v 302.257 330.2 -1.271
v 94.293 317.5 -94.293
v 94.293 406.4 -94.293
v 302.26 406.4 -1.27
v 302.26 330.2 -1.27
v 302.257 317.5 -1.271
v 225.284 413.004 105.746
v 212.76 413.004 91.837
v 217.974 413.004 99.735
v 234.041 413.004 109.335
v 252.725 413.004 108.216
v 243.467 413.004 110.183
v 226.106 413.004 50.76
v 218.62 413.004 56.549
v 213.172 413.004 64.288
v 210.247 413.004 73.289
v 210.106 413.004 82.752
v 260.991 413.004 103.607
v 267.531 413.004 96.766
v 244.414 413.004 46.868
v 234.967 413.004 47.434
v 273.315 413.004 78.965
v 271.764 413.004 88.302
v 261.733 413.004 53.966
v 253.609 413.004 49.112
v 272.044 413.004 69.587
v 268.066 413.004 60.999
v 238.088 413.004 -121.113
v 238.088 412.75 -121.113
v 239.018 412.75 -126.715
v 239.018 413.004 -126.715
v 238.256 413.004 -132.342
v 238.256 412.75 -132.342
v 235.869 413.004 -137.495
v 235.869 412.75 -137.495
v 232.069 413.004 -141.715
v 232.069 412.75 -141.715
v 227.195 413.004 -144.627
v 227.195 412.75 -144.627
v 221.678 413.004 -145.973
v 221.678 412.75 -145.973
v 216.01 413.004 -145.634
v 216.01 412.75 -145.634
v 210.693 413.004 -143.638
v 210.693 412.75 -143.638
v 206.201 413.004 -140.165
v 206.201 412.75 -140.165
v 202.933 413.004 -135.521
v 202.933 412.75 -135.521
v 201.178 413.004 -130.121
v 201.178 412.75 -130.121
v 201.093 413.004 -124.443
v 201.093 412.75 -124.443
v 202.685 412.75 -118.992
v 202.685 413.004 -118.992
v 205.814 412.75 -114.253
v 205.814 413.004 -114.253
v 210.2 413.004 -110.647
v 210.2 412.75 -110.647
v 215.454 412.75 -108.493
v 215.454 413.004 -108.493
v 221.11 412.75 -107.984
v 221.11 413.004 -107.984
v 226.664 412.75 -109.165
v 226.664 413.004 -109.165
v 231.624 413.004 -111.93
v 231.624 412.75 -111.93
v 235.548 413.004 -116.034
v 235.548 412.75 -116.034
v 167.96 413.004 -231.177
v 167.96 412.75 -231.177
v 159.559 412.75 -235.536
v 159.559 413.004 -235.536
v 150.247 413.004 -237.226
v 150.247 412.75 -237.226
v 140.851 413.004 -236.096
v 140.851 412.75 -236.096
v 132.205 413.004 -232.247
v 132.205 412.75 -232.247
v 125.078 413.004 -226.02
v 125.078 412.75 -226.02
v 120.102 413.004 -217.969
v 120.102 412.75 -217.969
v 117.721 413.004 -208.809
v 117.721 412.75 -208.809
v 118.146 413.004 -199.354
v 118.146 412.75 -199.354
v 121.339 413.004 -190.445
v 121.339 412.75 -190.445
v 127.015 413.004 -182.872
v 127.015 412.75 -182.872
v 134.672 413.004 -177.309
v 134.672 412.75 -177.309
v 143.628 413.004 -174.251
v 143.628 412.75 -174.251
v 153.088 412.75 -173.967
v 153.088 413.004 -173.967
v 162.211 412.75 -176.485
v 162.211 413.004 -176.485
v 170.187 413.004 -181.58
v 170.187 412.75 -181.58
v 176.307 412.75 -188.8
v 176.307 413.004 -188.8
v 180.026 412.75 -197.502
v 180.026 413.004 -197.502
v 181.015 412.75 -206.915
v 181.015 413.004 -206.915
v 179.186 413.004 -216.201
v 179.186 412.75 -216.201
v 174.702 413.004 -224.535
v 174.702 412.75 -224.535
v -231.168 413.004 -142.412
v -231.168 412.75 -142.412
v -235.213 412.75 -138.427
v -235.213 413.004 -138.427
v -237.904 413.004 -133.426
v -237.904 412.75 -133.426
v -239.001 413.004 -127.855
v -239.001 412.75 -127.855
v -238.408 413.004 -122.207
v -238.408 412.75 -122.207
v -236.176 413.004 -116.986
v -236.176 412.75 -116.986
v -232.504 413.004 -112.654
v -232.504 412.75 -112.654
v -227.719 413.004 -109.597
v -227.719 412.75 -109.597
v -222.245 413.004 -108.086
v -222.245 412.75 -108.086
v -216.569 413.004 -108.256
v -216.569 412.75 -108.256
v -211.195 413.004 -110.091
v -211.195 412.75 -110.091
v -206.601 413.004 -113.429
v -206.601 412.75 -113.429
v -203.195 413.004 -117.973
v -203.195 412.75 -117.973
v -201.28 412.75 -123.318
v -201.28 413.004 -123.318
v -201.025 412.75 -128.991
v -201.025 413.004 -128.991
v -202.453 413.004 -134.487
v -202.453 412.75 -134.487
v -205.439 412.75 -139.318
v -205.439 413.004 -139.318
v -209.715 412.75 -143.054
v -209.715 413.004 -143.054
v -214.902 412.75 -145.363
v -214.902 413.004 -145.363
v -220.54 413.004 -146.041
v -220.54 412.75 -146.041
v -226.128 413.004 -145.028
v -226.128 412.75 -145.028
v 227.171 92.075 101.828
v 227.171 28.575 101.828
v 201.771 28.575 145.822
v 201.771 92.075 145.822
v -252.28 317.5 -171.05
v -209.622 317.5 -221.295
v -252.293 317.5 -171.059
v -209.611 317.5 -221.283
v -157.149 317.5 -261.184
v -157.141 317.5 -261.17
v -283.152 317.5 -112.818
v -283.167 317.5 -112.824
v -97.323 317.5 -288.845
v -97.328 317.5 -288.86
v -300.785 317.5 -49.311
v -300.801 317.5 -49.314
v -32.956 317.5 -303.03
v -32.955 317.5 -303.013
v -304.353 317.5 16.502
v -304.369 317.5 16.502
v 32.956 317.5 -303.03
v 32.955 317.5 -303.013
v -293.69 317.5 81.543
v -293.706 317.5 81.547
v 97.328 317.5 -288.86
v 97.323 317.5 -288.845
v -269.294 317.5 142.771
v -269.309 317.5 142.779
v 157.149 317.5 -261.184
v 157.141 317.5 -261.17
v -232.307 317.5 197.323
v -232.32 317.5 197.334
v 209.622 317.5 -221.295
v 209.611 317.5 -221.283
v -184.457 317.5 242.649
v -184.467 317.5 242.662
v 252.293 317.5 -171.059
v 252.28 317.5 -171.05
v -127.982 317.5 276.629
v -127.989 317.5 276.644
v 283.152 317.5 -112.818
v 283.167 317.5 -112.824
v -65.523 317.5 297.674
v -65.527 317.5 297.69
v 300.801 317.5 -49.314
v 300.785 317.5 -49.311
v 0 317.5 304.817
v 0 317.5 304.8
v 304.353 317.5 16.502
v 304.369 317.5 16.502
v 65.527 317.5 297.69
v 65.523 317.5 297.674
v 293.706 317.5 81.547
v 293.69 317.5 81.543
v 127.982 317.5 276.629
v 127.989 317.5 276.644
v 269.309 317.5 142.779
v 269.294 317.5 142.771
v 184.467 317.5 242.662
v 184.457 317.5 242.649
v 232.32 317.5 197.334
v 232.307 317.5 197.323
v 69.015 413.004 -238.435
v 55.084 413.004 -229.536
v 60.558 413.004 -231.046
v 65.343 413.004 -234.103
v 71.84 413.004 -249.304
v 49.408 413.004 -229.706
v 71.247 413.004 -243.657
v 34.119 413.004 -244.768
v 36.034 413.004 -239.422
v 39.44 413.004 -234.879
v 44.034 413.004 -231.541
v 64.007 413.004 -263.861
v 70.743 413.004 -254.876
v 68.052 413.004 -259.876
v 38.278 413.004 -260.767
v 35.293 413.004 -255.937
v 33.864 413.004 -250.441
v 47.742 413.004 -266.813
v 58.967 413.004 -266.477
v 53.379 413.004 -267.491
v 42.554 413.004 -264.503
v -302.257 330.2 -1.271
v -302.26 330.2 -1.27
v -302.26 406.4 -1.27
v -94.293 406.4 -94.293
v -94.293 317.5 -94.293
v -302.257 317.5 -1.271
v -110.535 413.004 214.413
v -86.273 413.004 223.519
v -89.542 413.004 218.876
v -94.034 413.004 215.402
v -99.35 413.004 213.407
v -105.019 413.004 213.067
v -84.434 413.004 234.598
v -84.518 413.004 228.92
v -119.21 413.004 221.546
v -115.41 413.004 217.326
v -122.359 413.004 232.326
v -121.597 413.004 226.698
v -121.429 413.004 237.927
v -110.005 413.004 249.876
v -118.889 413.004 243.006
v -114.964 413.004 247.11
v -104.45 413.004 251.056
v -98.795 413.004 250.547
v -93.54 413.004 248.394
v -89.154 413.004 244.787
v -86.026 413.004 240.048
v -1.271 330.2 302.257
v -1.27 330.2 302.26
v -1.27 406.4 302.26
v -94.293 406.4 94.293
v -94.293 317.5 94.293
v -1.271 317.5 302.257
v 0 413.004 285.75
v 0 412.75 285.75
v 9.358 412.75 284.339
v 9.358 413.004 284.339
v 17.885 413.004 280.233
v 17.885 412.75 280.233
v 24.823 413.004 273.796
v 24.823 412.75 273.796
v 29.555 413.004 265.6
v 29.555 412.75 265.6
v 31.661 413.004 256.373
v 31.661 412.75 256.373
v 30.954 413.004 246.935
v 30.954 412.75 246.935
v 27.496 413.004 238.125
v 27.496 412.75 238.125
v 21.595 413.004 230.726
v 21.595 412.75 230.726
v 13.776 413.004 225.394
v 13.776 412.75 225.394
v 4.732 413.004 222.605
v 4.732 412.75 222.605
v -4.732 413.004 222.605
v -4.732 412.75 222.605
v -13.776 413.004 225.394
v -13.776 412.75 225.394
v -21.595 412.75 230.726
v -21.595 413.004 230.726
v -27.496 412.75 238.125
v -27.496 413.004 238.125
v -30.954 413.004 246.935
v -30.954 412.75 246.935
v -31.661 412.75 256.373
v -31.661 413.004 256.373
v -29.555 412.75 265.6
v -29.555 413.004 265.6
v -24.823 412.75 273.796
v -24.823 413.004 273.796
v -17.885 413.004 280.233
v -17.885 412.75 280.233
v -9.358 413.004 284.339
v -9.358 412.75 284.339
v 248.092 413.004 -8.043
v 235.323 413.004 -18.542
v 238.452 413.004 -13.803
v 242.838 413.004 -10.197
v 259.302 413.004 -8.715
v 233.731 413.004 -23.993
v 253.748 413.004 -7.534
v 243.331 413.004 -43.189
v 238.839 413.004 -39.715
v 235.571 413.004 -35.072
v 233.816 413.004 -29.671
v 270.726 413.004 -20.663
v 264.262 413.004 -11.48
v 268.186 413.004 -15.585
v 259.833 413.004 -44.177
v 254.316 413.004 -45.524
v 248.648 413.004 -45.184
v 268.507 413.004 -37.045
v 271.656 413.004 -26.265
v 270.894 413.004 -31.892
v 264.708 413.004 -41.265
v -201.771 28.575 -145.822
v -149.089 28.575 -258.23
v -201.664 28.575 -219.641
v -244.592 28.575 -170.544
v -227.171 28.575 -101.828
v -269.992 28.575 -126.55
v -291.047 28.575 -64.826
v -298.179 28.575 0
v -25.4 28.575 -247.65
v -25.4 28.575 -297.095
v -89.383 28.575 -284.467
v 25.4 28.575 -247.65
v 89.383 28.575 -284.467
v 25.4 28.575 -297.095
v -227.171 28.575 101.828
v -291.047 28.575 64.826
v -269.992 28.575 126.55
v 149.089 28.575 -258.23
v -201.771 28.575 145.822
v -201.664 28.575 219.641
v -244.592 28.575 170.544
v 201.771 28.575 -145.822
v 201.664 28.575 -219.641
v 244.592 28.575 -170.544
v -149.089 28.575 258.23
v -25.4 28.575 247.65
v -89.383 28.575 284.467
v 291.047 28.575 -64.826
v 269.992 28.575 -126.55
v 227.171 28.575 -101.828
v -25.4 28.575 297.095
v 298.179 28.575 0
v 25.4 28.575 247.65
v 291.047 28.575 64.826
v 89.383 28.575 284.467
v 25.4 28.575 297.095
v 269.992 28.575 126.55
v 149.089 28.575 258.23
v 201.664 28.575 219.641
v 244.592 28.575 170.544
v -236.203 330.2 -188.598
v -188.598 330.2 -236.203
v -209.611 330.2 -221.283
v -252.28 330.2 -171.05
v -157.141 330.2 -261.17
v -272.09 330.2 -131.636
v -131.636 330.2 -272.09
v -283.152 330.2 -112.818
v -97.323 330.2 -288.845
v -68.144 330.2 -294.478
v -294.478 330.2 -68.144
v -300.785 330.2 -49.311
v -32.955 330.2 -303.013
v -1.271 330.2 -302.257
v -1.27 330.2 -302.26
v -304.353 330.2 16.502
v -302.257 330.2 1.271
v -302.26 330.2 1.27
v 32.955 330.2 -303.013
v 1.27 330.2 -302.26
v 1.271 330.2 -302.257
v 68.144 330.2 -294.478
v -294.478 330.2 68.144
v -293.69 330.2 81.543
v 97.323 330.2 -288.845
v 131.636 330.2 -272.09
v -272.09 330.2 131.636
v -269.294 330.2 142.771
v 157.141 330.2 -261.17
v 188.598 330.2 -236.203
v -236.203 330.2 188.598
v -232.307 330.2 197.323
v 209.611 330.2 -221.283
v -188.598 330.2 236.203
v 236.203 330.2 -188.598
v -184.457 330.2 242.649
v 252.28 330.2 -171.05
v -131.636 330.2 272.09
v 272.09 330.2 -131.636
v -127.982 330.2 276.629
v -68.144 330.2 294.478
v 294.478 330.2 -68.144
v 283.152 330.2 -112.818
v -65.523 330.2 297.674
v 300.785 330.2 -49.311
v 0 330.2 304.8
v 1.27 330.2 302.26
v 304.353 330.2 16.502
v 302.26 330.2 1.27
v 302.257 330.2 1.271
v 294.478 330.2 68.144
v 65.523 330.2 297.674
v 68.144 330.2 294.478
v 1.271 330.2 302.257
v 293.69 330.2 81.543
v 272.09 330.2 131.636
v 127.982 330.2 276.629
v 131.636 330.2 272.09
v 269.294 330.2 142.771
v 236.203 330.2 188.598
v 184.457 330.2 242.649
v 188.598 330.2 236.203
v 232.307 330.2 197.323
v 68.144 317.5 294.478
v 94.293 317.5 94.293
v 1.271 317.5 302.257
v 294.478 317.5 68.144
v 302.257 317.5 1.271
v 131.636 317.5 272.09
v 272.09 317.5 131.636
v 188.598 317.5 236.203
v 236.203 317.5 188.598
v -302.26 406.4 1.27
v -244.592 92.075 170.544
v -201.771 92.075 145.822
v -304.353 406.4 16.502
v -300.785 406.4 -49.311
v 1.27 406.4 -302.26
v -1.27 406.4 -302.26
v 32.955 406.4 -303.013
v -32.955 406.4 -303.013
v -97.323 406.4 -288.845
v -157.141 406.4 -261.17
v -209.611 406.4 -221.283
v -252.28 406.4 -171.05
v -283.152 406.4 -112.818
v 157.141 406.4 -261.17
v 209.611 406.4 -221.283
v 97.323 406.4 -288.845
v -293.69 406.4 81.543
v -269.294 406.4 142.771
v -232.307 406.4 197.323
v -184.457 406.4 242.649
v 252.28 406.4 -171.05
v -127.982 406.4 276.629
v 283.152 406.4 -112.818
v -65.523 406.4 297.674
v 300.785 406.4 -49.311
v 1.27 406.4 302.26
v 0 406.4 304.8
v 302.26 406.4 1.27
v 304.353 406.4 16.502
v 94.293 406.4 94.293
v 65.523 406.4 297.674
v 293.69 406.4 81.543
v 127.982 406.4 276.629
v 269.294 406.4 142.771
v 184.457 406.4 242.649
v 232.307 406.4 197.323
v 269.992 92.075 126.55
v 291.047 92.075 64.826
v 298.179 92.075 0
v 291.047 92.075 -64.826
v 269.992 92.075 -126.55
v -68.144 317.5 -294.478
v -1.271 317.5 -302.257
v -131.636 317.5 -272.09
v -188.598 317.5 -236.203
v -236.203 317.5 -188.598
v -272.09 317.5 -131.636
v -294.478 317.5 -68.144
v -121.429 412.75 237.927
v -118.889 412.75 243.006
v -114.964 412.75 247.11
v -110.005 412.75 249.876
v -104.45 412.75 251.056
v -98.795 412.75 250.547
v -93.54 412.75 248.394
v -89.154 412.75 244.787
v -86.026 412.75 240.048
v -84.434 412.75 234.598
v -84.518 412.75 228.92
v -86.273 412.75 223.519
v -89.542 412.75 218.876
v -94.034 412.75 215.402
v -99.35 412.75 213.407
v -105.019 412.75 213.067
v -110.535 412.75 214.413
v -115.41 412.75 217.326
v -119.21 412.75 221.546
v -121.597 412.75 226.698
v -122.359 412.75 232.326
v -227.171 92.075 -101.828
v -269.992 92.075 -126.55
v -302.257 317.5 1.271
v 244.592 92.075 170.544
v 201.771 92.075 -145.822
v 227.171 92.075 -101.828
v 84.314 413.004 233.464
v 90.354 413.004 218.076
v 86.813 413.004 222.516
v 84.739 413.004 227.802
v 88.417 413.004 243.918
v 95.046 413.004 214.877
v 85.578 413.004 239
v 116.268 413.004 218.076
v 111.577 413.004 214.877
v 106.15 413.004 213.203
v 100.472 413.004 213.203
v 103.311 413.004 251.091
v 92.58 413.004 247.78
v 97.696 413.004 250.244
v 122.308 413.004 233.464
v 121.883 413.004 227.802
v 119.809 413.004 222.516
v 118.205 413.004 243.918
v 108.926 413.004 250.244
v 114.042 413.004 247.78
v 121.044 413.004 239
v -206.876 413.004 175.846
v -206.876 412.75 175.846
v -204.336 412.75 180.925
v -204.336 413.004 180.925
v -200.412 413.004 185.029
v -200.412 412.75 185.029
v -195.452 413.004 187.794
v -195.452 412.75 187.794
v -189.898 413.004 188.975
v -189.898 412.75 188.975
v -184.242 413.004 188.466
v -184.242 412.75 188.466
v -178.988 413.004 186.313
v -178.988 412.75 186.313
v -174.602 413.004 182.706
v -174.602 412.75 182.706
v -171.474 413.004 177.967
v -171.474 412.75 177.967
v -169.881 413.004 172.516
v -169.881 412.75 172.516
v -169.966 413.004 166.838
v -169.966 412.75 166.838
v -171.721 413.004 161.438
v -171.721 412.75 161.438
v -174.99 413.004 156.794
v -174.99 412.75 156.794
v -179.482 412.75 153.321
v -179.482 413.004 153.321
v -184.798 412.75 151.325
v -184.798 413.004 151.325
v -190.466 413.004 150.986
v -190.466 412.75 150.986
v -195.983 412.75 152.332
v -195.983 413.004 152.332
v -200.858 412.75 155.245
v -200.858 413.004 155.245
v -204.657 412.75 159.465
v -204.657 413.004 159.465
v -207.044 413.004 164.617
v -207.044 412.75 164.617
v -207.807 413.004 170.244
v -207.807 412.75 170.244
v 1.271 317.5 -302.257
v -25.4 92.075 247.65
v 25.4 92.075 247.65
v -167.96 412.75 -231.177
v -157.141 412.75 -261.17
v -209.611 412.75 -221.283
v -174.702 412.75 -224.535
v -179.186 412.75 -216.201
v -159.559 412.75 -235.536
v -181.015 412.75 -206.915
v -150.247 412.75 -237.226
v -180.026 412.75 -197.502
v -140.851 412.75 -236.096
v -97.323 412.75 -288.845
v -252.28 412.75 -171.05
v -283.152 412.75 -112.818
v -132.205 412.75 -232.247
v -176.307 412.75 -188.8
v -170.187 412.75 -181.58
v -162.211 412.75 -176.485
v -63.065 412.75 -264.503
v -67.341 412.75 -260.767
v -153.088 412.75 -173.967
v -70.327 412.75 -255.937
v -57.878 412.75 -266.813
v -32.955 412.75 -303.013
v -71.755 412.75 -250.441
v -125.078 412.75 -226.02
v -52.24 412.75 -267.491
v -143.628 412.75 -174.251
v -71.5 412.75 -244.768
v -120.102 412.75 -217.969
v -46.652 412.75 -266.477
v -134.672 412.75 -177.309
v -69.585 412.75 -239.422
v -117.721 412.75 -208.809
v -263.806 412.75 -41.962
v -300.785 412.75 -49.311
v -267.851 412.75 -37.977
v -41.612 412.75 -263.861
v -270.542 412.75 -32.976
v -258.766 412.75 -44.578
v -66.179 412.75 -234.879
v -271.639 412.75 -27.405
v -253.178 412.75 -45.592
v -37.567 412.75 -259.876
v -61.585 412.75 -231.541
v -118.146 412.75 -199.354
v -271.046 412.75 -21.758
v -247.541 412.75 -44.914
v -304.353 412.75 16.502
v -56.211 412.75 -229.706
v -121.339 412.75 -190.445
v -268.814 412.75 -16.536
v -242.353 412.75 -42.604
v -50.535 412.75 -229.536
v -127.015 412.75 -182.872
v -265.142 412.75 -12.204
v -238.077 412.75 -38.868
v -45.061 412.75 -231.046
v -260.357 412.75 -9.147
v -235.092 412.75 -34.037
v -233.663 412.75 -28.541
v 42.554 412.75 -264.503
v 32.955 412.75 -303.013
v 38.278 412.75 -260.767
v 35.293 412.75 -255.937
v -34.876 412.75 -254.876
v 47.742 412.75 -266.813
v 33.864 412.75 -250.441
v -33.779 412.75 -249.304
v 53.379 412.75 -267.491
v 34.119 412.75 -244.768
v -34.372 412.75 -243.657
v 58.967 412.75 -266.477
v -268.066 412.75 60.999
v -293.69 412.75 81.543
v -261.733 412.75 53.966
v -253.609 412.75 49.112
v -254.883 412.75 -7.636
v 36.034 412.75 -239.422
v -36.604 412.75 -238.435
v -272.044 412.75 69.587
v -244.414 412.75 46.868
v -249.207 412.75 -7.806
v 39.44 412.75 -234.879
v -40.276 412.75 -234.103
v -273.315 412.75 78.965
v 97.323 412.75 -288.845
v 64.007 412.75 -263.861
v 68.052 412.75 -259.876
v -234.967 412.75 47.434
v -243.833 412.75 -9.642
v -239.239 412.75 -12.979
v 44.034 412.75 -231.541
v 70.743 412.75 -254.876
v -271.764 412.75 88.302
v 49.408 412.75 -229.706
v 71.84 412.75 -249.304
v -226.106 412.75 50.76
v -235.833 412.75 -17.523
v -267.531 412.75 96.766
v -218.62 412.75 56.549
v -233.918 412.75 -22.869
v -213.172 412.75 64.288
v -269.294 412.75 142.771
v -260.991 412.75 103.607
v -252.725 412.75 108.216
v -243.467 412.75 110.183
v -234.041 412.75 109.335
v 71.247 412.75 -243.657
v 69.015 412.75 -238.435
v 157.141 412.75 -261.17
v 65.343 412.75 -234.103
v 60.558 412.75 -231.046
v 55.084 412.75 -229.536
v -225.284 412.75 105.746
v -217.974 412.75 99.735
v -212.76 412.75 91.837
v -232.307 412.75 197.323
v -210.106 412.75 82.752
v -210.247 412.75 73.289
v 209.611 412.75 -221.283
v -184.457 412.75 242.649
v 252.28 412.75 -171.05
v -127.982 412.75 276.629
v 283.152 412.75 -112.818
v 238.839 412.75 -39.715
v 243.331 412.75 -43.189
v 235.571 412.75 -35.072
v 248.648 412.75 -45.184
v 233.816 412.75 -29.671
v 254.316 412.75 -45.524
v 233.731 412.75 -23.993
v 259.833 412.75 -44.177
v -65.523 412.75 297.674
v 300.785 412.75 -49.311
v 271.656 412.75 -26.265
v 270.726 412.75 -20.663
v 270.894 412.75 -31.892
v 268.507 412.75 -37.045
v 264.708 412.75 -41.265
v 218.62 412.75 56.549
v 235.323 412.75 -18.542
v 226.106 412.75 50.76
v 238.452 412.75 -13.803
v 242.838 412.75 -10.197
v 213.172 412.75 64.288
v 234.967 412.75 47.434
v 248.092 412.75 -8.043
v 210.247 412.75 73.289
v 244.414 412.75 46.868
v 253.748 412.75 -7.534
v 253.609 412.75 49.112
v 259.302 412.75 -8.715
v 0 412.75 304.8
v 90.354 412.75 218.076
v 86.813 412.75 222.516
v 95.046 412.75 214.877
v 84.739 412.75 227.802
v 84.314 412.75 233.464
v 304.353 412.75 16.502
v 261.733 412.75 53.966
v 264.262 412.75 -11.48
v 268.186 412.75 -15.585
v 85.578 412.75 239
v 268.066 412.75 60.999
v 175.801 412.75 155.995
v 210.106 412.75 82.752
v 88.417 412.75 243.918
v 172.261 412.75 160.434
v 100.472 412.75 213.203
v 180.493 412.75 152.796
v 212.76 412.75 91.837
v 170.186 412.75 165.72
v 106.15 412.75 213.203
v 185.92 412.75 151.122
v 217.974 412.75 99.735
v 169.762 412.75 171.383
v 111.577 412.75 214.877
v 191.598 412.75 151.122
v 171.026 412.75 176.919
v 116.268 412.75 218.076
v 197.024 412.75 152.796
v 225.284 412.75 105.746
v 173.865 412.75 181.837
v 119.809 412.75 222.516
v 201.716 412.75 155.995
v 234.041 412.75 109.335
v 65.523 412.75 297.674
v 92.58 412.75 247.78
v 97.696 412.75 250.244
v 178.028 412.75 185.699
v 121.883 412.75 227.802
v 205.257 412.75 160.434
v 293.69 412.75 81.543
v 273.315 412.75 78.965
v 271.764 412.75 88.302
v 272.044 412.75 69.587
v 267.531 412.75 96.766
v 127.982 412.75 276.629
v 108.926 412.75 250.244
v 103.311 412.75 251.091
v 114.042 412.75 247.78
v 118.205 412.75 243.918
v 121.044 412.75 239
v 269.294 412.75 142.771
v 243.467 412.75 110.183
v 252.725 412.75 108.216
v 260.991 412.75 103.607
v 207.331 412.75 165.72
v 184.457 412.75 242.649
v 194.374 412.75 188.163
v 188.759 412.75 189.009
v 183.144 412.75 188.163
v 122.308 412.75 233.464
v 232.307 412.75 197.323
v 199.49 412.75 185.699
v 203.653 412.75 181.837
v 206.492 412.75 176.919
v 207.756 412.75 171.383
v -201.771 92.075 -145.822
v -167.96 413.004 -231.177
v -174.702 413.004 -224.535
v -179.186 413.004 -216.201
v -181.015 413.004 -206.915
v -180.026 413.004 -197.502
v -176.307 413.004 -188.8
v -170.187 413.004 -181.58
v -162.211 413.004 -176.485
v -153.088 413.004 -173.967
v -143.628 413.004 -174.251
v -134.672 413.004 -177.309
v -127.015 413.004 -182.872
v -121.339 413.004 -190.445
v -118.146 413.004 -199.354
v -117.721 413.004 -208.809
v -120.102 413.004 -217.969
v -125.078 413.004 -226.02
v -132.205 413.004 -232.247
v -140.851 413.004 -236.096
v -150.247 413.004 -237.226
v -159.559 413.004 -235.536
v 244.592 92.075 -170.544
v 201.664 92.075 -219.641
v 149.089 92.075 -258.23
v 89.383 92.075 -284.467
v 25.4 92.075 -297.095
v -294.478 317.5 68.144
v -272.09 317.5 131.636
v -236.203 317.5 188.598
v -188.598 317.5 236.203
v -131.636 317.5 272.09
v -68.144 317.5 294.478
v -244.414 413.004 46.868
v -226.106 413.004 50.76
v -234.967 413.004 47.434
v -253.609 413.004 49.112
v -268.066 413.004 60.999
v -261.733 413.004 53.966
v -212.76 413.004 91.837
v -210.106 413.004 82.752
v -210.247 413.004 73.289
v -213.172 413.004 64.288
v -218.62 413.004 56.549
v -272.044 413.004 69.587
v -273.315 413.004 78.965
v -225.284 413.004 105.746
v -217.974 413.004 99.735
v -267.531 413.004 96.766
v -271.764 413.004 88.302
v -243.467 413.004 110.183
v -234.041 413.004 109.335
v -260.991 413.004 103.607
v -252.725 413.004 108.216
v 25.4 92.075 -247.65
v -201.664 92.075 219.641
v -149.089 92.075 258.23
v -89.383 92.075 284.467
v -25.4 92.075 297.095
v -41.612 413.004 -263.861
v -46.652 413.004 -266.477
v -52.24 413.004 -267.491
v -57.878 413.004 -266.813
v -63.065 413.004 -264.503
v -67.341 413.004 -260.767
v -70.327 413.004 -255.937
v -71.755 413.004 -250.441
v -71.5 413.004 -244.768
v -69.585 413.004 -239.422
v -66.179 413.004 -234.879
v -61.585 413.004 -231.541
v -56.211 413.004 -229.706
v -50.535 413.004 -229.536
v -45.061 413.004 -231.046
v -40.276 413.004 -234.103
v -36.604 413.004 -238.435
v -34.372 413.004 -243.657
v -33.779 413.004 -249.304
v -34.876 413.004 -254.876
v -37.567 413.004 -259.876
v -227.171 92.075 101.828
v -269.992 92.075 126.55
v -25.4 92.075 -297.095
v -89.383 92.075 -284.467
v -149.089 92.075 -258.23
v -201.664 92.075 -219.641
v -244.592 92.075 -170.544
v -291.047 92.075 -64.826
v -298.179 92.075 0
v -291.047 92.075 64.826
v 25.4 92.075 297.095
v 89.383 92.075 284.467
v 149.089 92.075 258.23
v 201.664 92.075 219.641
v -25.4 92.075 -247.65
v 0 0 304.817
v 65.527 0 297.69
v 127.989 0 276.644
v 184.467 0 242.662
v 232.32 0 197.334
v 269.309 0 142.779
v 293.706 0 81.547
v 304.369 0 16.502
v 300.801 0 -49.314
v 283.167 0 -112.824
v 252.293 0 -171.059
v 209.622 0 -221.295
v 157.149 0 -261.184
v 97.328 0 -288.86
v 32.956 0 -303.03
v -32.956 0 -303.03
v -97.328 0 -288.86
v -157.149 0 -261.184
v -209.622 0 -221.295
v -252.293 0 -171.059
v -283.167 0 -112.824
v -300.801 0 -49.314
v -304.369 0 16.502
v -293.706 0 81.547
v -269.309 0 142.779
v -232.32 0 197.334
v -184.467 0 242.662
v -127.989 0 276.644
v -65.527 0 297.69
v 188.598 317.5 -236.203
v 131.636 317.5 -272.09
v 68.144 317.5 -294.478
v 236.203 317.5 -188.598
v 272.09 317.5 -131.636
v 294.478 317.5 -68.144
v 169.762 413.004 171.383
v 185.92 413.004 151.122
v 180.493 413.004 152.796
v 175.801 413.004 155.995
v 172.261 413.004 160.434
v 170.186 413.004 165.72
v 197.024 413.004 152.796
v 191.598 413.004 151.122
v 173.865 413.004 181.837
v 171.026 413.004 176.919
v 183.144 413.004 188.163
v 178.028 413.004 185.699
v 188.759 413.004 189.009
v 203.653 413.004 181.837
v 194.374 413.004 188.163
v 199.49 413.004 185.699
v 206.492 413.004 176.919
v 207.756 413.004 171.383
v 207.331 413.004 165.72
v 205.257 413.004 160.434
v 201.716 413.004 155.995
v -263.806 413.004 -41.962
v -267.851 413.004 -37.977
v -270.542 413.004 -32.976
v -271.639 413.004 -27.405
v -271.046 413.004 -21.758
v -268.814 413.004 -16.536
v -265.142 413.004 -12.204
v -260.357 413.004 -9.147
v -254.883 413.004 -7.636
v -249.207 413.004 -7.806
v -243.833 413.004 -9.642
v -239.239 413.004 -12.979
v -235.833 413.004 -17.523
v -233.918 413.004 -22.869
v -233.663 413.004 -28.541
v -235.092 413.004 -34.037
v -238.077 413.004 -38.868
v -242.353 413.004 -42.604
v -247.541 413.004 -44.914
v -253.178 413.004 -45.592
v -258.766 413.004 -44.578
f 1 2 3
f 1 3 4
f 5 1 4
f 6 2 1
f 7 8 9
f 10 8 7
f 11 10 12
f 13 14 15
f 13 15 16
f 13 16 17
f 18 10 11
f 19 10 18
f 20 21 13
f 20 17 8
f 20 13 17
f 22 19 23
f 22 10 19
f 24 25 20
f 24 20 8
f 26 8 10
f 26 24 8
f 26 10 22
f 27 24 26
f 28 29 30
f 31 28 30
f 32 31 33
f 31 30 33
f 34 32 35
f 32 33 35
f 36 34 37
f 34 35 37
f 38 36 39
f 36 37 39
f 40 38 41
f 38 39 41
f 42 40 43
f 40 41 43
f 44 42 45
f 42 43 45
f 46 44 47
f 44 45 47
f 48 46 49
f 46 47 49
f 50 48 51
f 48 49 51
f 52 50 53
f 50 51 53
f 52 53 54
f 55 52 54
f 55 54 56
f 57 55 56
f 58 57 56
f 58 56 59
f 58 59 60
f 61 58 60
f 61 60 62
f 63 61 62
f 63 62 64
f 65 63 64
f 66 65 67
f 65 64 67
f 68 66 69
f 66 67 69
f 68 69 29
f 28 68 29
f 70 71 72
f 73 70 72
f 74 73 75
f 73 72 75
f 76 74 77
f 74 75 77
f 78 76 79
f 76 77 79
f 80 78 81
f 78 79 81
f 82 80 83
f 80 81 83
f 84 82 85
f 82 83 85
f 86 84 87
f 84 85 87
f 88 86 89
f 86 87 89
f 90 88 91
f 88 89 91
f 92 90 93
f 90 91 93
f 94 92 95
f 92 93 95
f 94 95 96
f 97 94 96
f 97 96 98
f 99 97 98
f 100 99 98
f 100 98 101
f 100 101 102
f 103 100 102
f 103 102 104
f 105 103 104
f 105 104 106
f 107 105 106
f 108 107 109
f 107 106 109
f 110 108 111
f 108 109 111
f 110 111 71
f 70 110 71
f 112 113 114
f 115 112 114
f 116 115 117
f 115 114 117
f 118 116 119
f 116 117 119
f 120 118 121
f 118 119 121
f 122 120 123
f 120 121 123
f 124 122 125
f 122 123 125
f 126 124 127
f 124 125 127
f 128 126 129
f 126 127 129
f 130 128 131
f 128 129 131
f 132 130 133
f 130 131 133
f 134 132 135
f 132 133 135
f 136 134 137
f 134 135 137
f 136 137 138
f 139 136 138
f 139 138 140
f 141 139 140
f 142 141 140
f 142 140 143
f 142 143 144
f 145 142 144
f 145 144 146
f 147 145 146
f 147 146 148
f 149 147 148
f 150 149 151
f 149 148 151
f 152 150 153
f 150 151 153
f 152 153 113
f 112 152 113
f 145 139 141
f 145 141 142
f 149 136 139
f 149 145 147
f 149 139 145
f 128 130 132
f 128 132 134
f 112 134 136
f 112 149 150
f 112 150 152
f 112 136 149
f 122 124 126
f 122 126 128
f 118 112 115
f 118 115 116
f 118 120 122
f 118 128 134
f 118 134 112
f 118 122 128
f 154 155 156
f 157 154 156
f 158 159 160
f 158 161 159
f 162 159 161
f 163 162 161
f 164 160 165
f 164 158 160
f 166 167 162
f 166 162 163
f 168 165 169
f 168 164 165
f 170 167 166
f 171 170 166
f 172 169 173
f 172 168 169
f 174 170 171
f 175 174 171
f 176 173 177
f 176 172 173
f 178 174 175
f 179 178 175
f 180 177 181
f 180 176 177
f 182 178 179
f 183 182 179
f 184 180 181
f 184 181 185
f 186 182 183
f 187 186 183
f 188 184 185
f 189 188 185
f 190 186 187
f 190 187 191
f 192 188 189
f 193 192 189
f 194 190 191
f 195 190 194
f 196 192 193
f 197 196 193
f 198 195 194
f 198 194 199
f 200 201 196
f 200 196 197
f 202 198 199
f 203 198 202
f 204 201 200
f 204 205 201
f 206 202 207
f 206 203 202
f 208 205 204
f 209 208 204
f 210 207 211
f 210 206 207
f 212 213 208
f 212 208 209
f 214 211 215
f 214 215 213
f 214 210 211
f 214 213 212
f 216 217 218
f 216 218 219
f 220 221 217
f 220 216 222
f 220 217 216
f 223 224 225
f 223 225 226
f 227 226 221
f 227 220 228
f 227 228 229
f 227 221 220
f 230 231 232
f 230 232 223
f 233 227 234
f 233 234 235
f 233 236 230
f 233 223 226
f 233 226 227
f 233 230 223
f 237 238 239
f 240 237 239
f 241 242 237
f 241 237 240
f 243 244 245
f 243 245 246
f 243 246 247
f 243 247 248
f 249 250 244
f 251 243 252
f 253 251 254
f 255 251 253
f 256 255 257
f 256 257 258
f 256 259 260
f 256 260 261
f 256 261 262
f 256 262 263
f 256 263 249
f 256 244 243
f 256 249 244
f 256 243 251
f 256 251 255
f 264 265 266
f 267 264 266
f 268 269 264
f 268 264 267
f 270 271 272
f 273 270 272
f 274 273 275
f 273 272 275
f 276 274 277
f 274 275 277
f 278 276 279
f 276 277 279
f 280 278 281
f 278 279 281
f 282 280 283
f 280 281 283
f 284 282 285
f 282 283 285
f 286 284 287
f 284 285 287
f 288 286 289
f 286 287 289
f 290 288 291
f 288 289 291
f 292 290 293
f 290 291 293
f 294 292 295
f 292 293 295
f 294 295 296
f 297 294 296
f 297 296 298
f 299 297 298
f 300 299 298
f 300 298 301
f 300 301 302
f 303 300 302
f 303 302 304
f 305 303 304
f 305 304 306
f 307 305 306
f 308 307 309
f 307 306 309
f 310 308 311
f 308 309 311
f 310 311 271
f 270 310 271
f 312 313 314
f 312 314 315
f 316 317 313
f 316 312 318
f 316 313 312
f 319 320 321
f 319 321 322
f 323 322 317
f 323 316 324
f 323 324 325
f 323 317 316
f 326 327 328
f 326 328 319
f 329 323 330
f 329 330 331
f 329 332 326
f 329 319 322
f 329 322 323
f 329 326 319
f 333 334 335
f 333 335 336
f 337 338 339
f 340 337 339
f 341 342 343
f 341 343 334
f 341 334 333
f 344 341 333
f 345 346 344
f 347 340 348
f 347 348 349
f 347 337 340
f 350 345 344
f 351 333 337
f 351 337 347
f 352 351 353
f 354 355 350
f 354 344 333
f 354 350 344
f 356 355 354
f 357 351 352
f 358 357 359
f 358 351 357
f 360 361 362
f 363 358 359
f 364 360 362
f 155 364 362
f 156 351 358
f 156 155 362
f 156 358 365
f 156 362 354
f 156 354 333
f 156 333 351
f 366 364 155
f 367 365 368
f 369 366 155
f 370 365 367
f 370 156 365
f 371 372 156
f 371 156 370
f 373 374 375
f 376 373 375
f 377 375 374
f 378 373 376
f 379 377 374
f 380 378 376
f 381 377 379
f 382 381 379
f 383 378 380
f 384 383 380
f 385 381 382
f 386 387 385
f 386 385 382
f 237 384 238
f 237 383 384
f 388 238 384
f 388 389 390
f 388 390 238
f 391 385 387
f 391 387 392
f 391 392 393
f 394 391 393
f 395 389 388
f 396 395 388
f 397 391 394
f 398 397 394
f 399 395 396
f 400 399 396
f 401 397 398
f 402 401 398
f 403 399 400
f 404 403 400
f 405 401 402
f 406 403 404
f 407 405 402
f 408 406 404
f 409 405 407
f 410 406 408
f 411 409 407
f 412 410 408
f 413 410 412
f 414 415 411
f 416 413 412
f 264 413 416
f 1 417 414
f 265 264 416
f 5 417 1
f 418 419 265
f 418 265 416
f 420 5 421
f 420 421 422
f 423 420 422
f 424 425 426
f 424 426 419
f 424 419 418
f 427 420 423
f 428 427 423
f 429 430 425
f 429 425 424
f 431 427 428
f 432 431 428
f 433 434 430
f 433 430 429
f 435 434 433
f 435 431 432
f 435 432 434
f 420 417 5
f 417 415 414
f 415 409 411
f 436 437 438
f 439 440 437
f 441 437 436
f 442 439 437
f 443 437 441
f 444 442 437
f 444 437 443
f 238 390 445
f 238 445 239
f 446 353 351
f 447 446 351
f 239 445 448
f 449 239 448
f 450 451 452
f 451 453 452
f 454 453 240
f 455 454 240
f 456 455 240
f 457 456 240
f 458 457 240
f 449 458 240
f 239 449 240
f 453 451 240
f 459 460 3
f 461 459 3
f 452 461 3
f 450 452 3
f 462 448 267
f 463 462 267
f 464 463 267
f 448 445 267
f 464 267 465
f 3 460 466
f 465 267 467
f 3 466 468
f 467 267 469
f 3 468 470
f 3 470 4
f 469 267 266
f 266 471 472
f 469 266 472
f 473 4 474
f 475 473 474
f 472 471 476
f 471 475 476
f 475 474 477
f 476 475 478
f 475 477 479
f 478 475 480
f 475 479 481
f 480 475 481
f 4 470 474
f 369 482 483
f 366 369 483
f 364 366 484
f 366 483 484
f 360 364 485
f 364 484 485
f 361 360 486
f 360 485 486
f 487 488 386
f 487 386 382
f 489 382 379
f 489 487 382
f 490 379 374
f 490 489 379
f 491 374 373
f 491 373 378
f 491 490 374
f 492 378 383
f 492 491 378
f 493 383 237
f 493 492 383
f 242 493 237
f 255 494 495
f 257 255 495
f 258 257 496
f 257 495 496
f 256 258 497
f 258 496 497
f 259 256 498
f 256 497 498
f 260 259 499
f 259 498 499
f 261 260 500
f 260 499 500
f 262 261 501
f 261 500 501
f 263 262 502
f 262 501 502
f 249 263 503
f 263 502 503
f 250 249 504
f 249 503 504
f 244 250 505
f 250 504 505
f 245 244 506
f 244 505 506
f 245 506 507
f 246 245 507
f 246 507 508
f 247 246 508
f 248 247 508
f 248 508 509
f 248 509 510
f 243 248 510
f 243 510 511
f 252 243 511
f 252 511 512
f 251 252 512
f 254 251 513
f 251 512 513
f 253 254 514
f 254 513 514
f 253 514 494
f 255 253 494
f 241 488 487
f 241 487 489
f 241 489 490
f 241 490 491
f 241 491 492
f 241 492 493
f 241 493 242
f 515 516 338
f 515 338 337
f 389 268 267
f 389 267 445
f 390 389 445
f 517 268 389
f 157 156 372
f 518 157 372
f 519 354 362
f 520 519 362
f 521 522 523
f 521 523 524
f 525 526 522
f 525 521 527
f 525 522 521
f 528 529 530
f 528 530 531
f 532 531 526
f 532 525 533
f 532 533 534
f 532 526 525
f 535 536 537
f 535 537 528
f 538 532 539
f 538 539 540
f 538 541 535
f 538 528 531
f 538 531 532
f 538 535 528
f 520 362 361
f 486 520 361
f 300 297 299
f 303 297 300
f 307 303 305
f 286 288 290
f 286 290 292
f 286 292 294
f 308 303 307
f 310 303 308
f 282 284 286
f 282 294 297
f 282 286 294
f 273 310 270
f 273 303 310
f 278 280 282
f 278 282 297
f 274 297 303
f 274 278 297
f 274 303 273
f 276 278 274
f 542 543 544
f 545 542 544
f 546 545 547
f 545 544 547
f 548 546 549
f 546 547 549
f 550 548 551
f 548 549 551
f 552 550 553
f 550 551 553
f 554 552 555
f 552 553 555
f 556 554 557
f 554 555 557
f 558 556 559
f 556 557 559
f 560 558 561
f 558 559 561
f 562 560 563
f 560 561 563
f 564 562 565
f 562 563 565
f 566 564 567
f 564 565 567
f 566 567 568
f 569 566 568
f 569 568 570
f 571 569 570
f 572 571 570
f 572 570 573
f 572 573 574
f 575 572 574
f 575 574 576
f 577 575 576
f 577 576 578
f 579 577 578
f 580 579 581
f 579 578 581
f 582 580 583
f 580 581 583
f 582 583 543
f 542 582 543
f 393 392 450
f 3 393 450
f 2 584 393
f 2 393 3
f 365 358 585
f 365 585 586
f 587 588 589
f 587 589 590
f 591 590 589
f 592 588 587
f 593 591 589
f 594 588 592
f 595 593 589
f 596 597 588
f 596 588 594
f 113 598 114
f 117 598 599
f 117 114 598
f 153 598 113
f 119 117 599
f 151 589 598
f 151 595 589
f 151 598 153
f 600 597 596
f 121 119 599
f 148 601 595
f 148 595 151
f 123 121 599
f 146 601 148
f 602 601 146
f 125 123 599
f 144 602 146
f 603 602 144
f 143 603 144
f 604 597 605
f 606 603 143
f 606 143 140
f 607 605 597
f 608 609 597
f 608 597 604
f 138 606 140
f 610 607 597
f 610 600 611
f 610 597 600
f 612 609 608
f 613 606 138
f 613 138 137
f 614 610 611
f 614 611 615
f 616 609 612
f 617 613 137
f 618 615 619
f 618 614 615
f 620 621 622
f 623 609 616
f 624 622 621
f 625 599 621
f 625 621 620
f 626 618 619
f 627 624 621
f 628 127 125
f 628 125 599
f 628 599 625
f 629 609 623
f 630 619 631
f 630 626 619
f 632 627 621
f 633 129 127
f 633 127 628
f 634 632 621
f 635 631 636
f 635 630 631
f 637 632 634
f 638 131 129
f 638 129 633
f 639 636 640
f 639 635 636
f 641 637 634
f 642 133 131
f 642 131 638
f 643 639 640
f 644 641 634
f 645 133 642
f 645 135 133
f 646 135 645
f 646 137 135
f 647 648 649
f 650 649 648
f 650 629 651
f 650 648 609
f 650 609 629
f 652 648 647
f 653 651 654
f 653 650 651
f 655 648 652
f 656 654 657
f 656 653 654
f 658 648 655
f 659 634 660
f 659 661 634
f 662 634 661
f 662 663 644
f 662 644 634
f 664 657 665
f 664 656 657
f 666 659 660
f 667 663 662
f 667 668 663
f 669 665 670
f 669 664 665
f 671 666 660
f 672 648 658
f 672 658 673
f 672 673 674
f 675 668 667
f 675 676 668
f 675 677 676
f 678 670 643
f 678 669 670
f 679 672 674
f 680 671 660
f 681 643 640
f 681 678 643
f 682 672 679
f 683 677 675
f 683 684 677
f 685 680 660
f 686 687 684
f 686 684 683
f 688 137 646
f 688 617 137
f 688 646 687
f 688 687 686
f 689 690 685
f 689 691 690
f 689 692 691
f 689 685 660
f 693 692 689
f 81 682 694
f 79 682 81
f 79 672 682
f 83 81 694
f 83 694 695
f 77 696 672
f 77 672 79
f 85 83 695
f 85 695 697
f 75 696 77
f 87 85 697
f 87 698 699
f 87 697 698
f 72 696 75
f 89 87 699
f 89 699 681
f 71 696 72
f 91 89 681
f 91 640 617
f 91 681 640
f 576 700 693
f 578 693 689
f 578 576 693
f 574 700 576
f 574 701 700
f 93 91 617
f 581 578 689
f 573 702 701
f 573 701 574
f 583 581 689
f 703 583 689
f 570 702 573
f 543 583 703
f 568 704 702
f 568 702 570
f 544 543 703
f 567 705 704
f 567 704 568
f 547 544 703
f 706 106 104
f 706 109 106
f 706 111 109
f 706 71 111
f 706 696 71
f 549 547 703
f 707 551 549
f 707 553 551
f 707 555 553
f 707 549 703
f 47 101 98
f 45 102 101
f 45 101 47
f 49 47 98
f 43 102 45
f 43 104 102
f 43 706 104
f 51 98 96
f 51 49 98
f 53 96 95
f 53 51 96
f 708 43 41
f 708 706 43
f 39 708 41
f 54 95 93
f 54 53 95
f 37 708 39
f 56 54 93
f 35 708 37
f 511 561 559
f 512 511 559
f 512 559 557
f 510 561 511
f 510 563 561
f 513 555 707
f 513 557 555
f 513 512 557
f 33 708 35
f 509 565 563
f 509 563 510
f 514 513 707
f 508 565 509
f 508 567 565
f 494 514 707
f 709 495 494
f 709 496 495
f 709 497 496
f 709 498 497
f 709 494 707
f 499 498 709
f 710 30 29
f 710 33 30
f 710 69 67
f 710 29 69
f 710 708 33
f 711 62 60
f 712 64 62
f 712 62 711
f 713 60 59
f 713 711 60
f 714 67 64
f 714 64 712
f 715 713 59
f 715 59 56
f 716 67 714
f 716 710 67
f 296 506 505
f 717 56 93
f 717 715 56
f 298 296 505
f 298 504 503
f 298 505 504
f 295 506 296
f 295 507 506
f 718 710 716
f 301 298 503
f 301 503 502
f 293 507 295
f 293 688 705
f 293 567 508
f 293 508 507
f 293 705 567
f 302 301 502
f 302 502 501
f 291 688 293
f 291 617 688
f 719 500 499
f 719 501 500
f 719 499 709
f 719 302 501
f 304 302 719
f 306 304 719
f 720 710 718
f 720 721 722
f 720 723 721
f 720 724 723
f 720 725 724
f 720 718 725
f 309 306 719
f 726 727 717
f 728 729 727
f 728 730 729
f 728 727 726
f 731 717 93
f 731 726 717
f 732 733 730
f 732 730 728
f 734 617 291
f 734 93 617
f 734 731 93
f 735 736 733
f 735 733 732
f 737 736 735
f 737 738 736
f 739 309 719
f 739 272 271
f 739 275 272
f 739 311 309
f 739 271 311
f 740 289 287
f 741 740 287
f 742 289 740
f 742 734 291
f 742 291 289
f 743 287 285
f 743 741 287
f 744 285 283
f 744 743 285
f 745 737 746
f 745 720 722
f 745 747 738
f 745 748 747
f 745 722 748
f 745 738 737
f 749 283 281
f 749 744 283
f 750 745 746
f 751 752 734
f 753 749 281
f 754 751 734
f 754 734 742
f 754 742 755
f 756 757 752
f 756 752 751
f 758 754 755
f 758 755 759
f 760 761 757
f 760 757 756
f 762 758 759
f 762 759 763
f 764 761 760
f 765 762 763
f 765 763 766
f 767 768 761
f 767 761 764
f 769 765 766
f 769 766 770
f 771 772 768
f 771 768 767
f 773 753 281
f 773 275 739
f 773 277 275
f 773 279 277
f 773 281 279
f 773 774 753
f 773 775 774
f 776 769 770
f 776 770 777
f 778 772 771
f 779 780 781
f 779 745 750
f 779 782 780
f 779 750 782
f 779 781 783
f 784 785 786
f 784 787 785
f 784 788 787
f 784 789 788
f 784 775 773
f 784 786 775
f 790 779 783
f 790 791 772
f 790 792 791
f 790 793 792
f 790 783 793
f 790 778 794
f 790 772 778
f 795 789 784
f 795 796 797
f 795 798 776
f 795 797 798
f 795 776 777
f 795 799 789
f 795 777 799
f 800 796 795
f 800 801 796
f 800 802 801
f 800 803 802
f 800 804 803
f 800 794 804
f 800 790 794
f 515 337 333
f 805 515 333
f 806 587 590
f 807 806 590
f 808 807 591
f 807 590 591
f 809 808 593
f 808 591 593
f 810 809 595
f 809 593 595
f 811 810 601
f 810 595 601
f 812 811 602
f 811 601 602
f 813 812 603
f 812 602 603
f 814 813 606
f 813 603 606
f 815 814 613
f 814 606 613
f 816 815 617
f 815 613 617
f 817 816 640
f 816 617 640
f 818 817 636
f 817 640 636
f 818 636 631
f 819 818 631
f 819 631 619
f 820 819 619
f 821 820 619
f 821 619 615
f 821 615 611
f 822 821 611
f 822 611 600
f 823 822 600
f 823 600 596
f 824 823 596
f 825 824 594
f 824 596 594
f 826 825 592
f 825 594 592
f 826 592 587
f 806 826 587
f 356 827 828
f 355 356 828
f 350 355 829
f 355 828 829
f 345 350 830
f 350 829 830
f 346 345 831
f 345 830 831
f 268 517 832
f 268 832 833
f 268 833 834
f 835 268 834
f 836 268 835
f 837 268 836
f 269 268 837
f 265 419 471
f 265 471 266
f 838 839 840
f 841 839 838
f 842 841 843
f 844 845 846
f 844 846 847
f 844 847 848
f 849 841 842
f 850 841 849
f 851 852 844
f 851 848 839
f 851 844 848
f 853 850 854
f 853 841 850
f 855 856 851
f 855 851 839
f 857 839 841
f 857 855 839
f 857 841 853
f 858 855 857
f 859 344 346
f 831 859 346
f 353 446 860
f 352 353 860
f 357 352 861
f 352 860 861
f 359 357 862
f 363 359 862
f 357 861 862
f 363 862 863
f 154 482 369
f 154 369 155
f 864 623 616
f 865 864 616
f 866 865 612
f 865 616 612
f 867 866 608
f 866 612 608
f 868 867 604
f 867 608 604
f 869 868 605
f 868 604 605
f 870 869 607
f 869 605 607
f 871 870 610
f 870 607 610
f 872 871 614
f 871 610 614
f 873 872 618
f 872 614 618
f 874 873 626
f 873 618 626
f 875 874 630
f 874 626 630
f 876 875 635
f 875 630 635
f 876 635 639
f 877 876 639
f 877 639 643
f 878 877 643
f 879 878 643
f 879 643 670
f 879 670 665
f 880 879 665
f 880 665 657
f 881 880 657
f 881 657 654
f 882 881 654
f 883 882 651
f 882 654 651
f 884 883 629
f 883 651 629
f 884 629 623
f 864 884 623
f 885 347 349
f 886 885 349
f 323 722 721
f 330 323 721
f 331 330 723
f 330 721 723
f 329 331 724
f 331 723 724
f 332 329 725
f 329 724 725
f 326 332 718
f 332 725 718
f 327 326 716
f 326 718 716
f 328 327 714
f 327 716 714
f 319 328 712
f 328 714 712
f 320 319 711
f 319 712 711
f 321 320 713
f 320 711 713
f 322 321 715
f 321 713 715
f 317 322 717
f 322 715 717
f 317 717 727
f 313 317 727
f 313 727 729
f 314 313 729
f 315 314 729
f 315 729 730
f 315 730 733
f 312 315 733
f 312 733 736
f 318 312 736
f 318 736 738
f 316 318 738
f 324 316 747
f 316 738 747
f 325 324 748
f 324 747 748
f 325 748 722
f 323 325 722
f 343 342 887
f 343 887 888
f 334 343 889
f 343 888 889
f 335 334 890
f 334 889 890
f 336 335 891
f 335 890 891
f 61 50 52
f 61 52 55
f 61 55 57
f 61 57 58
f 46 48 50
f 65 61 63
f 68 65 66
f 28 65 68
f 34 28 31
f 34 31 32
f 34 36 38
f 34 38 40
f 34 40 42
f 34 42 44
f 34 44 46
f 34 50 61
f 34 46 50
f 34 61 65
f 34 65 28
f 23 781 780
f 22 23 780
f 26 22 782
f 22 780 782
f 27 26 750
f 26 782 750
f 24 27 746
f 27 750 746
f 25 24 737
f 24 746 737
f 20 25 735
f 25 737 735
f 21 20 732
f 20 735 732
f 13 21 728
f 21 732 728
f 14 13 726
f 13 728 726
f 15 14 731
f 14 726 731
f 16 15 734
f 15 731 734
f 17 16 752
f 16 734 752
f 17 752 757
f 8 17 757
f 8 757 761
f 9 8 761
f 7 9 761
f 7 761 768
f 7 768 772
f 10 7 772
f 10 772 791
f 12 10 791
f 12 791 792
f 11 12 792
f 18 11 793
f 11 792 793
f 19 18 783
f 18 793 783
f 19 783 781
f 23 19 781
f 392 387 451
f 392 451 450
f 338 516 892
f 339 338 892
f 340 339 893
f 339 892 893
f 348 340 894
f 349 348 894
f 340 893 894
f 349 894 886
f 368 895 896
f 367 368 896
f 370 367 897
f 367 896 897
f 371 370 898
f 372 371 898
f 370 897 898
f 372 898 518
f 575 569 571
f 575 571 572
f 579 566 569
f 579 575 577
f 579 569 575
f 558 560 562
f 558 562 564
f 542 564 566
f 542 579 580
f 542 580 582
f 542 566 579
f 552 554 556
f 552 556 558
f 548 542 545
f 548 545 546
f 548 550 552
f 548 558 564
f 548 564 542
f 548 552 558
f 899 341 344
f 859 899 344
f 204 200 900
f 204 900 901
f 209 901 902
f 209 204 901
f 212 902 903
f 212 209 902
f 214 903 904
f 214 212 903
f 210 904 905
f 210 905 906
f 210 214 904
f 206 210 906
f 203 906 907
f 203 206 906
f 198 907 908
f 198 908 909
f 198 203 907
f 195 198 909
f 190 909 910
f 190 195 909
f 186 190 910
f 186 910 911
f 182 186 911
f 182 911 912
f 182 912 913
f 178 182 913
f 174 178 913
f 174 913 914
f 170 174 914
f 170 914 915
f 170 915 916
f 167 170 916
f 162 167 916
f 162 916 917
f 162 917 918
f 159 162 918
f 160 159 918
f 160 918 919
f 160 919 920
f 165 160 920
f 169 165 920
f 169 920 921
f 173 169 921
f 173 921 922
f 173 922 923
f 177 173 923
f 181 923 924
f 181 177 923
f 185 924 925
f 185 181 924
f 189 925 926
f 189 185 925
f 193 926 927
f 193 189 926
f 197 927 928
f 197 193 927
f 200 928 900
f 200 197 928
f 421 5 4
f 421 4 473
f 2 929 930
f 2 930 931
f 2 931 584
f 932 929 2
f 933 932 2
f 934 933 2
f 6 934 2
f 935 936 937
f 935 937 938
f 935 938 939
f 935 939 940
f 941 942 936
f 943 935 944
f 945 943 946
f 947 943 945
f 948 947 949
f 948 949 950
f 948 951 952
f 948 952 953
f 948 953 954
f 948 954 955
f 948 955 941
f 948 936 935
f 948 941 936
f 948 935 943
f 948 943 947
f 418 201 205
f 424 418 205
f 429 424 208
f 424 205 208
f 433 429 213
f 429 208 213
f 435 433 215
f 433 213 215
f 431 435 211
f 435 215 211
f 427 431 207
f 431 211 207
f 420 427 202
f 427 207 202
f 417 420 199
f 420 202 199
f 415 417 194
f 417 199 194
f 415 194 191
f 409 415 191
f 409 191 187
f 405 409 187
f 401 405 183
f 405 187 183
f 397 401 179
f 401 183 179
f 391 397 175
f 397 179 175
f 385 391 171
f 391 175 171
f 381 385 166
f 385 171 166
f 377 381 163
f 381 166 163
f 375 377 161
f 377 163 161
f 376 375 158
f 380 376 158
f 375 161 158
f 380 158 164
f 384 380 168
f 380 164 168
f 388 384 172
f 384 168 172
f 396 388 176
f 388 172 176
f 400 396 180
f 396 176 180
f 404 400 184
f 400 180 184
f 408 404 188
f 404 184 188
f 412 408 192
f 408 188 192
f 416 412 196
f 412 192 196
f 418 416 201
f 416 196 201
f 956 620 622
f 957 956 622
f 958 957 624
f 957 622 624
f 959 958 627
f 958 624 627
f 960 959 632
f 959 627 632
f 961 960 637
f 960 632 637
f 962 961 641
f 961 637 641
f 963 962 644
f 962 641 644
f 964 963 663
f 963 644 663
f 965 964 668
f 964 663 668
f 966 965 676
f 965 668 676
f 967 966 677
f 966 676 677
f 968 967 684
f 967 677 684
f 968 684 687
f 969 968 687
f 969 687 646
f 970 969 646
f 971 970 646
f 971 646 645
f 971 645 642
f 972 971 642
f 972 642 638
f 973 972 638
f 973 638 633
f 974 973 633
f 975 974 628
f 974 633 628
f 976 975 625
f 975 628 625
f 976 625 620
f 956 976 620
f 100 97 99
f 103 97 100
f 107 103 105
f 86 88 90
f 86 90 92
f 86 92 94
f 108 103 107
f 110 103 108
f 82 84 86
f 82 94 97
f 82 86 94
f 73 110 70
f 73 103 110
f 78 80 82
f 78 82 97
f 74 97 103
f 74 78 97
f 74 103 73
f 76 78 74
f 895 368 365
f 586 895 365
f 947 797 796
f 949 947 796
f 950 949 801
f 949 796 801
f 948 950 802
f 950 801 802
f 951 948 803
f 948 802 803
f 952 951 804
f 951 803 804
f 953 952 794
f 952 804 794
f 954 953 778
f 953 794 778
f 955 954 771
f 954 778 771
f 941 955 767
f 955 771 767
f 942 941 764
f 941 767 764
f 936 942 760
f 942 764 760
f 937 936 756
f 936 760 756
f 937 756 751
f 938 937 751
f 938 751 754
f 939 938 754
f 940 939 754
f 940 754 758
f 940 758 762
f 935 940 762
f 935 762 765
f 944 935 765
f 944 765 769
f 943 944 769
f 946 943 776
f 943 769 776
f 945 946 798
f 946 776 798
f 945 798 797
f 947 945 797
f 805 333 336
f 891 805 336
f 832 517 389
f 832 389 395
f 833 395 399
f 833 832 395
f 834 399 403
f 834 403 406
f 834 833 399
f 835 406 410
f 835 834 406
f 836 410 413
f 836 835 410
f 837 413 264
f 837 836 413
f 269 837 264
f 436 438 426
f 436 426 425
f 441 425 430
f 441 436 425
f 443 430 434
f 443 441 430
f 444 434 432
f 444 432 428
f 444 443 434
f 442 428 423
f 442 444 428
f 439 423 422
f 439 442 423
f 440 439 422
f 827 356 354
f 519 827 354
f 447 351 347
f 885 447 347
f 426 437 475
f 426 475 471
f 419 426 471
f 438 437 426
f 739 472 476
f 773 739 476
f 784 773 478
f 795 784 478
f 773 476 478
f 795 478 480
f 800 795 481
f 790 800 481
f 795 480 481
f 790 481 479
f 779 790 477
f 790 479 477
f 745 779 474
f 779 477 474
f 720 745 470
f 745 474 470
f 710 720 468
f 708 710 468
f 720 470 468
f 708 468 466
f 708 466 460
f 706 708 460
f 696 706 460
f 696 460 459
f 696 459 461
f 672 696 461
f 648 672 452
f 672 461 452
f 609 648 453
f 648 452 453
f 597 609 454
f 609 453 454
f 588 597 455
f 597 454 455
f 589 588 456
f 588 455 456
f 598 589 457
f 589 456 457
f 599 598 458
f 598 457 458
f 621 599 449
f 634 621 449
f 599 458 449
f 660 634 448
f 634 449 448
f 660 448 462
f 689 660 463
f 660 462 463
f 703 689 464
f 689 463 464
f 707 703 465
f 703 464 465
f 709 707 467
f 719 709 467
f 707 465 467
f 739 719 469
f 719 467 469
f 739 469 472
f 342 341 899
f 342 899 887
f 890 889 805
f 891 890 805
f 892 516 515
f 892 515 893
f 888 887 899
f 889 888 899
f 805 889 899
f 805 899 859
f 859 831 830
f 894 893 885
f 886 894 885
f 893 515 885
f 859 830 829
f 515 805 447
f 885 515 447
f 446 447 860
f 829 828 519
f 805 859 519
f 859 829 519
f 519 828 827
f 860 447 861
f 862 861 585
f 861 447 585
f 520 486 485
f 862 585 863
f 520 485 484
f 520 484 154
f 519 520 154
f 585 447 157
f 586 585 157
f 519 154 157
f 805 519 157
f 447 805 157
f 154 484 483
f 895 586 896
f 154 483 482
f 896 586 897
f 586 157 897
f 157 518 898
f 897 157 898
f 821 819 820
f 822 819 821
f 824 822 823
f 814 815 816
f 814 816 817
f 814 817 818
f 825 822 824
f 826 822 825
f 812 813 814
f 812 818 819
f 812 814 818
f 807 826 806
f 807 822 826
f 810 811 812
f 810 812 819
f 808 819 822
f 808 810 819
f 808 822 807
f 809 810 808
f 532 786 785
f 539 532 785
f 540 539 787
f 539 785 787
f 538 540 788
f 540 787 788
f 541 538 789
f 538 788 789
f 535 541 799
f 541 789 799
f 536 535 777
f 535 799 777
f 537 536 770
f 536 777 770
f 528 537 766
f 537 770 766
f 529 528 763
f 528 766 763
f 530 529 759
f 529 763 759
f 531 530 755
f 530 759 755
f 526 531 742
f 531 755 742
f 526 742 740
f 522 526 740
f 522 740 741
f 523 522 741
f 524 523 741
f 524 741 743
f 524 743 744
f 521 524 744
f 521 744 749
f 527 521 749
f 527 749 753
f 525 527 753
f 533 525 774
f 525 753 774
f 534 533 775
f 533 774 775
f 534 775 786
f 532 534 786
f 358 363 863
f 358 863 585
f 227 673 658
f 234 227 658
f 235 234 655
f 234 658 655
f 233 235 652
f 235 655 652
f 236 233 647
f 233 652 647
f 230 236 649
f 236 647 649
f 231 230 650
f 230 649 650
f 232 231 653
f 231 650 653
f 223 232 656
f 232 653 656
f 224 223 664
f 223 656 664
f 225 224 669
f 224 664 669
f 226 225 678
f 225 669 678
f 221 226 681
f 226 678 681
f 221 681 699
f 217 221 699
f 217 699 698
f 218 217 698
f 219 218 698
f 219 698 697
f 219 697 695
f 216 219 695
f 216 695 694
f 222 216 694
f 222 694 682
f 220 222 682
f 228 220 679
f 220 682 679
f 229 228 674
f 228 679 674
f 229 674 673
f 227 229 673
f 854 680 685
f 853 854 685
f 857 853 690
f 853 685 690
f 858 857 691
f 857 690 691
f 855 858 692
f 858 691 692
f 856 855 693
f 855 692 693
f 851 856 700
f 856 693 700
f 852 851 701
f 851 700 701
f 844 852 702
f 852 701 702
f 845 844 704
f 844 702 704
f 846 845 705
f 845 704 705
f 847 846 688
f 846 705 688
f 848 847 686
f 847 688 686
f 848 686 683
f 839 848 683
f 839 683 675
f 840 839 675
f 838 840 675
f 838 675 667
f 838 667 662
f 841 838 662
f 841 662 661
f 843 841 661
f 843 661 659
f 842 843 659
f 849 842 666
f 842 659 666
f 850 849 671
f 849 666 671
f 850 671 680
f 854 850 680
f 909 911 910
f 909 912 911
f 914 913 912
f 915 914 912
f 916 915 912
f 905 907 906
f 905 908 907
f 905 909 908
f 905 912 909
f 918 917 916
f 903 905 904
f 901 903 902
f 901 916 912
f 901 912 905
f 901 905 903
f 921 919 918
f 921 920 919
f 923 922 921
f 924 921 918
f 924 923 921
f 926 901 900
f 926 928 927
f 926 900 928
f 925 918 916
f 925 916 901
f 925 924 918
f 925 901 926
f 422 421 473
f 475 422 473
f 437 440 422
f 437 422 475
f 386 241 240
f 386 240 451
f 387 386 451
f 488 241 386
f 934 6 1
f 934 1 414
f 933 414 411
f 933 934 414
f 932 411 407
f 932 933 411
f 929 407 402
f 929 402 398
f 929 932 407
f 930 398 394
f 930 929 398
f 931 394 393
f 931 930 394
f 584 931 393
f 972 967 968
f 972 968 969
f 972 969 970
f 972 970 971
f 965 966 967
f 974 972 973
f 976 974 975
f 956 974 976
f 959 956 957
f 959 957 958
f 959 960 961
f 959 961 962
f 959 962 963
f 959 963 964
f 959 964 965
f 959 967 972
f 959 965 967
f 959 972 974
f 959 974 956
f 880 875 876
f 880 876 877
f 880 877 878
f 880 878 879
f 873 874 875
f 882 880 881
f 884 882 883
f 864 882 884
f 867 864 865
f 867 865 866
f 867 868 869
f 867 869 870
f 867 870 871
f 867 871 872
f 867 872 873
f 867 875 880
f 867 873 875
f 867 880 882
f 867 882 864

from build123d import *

# Parameters (mm, degrees)
SKETCH1_R            = 304.8
BOSS_EXTRUDE1_DEPTH  = 28.575
SKETCH2_W            = 50.8
SKETCH2_H            = 50.8
BOSS_EXTRUDE2_DEPTH  = 63.5
SKETCH3_R            = 304.8
BOSS_EXTRUDE3_DEPTH  = 225.425
BOSS_EXTRUDE8_DEPTH  = 88.9
SKETCH10_R           = 304.8
BOSS_EXTRUDE11_DEPTH = 6.35
SKETCH11_R           = 304.8
SKETCH11_R_2         = 302.26
BOSS_EXTRUDE12_DEPTH = 12.7
BOSS_EXTRUDE10_REACH = 537.362
SKETCH9_R            = 304.81653601
SKETCH9_R_2          = 298.178711987
SKETCH12_R           = 31.75
SKETCH12_R_2         = 19.05
BOSS_EXTRUDE13_DEPTH = 0.254
CIRPATTERN1_COUNT    = 5


with BuildPart() as part:
    # Sketch1 → Boss-Extrude1 (new body)
    with BuildSketch(Plane(origin=(0, 0, 0), x_dir=(1, 0, 0), z_dir=(0, 1, 0))):
        with Locations(Location((0, 0, 0), (0, 0, 270))):
            Circle(SKETCH1_R)
    extrude(amount=BOSS_EXTRUDE1_DEPTH)

    # Sketch2 → Boss-Extrude2 (add)
    with BuildSketch(Plane(origin=(0, 28.575, 0), x_dir=(1, 0, 0), z_dir=(0, 1, 0))):
        Polygon((245.765281759, 171.222045256), (201.771191247, 145.822045256), (227.171191247, 101.827954744), (271.165281759, 127.227954744), align=None)
        with Locations((0, 273.05)):
            Rectangle(SKETCH2_W, SKETCH2_H)
        Polygon((271.165281759, -127.227954744), (227.171191247, -101.827954744), (201.771191247, -145.822045256), (245.765281759, -171.222045256), align=None)
        with Locations((0, -273.05)):
            Rectangle(SKETCH2_W, SKETCH2_H)
        Polygon((-245.765281759, -171.222045256), (-201.771191247, -145.822045256), (-227.171191247, -101.827954744), (-271.165281759, -127.227954744), align=None)
        Polygon((-271.165281759, 127.227954744), (-227.171191247, 101.827954744), (-201.771191247, 145.822045256), (-245.765281759, 171.222045256), align=None)
    extrude(amount=BOSS_EXTRUDE2_DEPTH)

    # Sketch3 → Boss-Extrude3 (add)
    with BuildSketch(Plane(origin=(0, 92.075, 0), x_dir=(1, 0, 0), z_dir=(0, 1, 0))):
        with Locations(Location((0, 0, 0), (0, 0, 270))):
            Circle(SKETCH3_R)
    extrude(amount=BOSS_EXTRUDE3_DEPTH)

    # Sketch6 → Boss-Extrude8 (add)
    with BuildSketch(Plane(origin=(0, 317.5, 0), x_dir=(1, 0, 0), z_dir=(0, 1, 0))):
        Polygon((94.292689271, 94.292689271), (302.26, 1.27), (302.26, -1.27), (94.292689271, -94.292689271), (1.27, -302.26), (-1.27, -302.26), (-94.292689271, -94.292689271), (-302.26, -1.27), (-302.26, 1.27), (-94.292689271, 94.292689271), (-1.27, 302.26), (1.27, 302.26), align=None)
    extrude(amount=BOSS_EXTRUDE8_DEPTH)

    # Sketch10 → Boss-Extrude11 (add)
    with BuildSketch(Plane(origin=(0, 406.4, 0), x_dir=(1, 0, 0), z_dir=(0, 1, 0))):
        with Locations(Location((0, 0, 0), (0, 0, 270))):
            Circle(SKETCH10_R)
    extrude(amount=BOSS_EXTRUDE11_DEPTH)

    # Sketch11 → Boss-Extrude12 (add)
    with BuildSketch(Plane(origin=(0, 317.5, 0), x_dir=(1, 0, 0), z_dir=(0, 1, 0))):
        with Locations(Location((0, 0, 0), (0, 0, 270))):
            Circle(SKETCH11_R)
        Circle(SKETCH11_R_2, mode=Mode.SUBTRACT)
    extrude(amount=BOSS_EXTRUDE12_DEPTH)

    # Boss-Extrude10: up to this face of the body (flat: up to its plane)
    boss_extrude10_end = Plane(part.part.faces().sort_by_distance((0, 0, 0))[0])
    # Sketch9 → Boss-Extrude10 (add, up to the picked face)
    with BuildSketch(Plane(origin=(0, 317.5, 0), x_dir=(1, 0, 0), z_dir=(0, 1, 0)), mode=Mode.PRIVATE) as boss_extrude10_sk1:
        with Locations(Location((0, 0, 0), (0, 0, 270))):
            Circle(SKETCH9_R)
        Circle(SKETCH9_R_2, mode=Mode.SUBTRACT)
    boss_extrude10_tool1 = split(extrude(boss_extrude10_sk1.sketch, amount=-BOSS_EXTRUDE10_REACH, mode=Mode.PRIVATE), bisect_by=boss_extrude10_end, keep=Keep.BOTH, mode=Mode.PRIVATE)
    add(boss_extrude10_tool1.solids().sort_by(Axis((0, 317.5, -303.954385), (0, -1, 0)))[0])

    # Sketch12 → Boss-Extrude13 (add)
    with BuildSketch(Plane(origin=(0, 412.75, 0), x_dir=(1, 0, 0), z_dir=(0, 1, 0))):
        with Locations(Location((0, -254, 0), (0, 0, 270))):
            Circle(SKETCH12_R)
        with Locations(Location((103.311107341, -232.040546241, 0), (0, 0, 270))):
            Circle(SKETCH12_R_2)
        with Locations(Location((188.758785671, -169.959174015, 0), (0, 0, 270))):
            Circle(SKETCH12_R_2)
    boss_extrude13 = extrude(amount=BOSS_EXTRUDE13_DEPTH)

    # CirPattern1: Boss-Extrude13 ×5 about axis
    cirpattern1_axis = Axis((0, 0, 0), (0, 1, 0))
    for i in range(1, CIRPATTERN1_COUNT):
        add(boss_extrude13.rotate(cirpattern1_axis, i * 360 / CIRPATTERN1_COUNT))


solid = part.part
